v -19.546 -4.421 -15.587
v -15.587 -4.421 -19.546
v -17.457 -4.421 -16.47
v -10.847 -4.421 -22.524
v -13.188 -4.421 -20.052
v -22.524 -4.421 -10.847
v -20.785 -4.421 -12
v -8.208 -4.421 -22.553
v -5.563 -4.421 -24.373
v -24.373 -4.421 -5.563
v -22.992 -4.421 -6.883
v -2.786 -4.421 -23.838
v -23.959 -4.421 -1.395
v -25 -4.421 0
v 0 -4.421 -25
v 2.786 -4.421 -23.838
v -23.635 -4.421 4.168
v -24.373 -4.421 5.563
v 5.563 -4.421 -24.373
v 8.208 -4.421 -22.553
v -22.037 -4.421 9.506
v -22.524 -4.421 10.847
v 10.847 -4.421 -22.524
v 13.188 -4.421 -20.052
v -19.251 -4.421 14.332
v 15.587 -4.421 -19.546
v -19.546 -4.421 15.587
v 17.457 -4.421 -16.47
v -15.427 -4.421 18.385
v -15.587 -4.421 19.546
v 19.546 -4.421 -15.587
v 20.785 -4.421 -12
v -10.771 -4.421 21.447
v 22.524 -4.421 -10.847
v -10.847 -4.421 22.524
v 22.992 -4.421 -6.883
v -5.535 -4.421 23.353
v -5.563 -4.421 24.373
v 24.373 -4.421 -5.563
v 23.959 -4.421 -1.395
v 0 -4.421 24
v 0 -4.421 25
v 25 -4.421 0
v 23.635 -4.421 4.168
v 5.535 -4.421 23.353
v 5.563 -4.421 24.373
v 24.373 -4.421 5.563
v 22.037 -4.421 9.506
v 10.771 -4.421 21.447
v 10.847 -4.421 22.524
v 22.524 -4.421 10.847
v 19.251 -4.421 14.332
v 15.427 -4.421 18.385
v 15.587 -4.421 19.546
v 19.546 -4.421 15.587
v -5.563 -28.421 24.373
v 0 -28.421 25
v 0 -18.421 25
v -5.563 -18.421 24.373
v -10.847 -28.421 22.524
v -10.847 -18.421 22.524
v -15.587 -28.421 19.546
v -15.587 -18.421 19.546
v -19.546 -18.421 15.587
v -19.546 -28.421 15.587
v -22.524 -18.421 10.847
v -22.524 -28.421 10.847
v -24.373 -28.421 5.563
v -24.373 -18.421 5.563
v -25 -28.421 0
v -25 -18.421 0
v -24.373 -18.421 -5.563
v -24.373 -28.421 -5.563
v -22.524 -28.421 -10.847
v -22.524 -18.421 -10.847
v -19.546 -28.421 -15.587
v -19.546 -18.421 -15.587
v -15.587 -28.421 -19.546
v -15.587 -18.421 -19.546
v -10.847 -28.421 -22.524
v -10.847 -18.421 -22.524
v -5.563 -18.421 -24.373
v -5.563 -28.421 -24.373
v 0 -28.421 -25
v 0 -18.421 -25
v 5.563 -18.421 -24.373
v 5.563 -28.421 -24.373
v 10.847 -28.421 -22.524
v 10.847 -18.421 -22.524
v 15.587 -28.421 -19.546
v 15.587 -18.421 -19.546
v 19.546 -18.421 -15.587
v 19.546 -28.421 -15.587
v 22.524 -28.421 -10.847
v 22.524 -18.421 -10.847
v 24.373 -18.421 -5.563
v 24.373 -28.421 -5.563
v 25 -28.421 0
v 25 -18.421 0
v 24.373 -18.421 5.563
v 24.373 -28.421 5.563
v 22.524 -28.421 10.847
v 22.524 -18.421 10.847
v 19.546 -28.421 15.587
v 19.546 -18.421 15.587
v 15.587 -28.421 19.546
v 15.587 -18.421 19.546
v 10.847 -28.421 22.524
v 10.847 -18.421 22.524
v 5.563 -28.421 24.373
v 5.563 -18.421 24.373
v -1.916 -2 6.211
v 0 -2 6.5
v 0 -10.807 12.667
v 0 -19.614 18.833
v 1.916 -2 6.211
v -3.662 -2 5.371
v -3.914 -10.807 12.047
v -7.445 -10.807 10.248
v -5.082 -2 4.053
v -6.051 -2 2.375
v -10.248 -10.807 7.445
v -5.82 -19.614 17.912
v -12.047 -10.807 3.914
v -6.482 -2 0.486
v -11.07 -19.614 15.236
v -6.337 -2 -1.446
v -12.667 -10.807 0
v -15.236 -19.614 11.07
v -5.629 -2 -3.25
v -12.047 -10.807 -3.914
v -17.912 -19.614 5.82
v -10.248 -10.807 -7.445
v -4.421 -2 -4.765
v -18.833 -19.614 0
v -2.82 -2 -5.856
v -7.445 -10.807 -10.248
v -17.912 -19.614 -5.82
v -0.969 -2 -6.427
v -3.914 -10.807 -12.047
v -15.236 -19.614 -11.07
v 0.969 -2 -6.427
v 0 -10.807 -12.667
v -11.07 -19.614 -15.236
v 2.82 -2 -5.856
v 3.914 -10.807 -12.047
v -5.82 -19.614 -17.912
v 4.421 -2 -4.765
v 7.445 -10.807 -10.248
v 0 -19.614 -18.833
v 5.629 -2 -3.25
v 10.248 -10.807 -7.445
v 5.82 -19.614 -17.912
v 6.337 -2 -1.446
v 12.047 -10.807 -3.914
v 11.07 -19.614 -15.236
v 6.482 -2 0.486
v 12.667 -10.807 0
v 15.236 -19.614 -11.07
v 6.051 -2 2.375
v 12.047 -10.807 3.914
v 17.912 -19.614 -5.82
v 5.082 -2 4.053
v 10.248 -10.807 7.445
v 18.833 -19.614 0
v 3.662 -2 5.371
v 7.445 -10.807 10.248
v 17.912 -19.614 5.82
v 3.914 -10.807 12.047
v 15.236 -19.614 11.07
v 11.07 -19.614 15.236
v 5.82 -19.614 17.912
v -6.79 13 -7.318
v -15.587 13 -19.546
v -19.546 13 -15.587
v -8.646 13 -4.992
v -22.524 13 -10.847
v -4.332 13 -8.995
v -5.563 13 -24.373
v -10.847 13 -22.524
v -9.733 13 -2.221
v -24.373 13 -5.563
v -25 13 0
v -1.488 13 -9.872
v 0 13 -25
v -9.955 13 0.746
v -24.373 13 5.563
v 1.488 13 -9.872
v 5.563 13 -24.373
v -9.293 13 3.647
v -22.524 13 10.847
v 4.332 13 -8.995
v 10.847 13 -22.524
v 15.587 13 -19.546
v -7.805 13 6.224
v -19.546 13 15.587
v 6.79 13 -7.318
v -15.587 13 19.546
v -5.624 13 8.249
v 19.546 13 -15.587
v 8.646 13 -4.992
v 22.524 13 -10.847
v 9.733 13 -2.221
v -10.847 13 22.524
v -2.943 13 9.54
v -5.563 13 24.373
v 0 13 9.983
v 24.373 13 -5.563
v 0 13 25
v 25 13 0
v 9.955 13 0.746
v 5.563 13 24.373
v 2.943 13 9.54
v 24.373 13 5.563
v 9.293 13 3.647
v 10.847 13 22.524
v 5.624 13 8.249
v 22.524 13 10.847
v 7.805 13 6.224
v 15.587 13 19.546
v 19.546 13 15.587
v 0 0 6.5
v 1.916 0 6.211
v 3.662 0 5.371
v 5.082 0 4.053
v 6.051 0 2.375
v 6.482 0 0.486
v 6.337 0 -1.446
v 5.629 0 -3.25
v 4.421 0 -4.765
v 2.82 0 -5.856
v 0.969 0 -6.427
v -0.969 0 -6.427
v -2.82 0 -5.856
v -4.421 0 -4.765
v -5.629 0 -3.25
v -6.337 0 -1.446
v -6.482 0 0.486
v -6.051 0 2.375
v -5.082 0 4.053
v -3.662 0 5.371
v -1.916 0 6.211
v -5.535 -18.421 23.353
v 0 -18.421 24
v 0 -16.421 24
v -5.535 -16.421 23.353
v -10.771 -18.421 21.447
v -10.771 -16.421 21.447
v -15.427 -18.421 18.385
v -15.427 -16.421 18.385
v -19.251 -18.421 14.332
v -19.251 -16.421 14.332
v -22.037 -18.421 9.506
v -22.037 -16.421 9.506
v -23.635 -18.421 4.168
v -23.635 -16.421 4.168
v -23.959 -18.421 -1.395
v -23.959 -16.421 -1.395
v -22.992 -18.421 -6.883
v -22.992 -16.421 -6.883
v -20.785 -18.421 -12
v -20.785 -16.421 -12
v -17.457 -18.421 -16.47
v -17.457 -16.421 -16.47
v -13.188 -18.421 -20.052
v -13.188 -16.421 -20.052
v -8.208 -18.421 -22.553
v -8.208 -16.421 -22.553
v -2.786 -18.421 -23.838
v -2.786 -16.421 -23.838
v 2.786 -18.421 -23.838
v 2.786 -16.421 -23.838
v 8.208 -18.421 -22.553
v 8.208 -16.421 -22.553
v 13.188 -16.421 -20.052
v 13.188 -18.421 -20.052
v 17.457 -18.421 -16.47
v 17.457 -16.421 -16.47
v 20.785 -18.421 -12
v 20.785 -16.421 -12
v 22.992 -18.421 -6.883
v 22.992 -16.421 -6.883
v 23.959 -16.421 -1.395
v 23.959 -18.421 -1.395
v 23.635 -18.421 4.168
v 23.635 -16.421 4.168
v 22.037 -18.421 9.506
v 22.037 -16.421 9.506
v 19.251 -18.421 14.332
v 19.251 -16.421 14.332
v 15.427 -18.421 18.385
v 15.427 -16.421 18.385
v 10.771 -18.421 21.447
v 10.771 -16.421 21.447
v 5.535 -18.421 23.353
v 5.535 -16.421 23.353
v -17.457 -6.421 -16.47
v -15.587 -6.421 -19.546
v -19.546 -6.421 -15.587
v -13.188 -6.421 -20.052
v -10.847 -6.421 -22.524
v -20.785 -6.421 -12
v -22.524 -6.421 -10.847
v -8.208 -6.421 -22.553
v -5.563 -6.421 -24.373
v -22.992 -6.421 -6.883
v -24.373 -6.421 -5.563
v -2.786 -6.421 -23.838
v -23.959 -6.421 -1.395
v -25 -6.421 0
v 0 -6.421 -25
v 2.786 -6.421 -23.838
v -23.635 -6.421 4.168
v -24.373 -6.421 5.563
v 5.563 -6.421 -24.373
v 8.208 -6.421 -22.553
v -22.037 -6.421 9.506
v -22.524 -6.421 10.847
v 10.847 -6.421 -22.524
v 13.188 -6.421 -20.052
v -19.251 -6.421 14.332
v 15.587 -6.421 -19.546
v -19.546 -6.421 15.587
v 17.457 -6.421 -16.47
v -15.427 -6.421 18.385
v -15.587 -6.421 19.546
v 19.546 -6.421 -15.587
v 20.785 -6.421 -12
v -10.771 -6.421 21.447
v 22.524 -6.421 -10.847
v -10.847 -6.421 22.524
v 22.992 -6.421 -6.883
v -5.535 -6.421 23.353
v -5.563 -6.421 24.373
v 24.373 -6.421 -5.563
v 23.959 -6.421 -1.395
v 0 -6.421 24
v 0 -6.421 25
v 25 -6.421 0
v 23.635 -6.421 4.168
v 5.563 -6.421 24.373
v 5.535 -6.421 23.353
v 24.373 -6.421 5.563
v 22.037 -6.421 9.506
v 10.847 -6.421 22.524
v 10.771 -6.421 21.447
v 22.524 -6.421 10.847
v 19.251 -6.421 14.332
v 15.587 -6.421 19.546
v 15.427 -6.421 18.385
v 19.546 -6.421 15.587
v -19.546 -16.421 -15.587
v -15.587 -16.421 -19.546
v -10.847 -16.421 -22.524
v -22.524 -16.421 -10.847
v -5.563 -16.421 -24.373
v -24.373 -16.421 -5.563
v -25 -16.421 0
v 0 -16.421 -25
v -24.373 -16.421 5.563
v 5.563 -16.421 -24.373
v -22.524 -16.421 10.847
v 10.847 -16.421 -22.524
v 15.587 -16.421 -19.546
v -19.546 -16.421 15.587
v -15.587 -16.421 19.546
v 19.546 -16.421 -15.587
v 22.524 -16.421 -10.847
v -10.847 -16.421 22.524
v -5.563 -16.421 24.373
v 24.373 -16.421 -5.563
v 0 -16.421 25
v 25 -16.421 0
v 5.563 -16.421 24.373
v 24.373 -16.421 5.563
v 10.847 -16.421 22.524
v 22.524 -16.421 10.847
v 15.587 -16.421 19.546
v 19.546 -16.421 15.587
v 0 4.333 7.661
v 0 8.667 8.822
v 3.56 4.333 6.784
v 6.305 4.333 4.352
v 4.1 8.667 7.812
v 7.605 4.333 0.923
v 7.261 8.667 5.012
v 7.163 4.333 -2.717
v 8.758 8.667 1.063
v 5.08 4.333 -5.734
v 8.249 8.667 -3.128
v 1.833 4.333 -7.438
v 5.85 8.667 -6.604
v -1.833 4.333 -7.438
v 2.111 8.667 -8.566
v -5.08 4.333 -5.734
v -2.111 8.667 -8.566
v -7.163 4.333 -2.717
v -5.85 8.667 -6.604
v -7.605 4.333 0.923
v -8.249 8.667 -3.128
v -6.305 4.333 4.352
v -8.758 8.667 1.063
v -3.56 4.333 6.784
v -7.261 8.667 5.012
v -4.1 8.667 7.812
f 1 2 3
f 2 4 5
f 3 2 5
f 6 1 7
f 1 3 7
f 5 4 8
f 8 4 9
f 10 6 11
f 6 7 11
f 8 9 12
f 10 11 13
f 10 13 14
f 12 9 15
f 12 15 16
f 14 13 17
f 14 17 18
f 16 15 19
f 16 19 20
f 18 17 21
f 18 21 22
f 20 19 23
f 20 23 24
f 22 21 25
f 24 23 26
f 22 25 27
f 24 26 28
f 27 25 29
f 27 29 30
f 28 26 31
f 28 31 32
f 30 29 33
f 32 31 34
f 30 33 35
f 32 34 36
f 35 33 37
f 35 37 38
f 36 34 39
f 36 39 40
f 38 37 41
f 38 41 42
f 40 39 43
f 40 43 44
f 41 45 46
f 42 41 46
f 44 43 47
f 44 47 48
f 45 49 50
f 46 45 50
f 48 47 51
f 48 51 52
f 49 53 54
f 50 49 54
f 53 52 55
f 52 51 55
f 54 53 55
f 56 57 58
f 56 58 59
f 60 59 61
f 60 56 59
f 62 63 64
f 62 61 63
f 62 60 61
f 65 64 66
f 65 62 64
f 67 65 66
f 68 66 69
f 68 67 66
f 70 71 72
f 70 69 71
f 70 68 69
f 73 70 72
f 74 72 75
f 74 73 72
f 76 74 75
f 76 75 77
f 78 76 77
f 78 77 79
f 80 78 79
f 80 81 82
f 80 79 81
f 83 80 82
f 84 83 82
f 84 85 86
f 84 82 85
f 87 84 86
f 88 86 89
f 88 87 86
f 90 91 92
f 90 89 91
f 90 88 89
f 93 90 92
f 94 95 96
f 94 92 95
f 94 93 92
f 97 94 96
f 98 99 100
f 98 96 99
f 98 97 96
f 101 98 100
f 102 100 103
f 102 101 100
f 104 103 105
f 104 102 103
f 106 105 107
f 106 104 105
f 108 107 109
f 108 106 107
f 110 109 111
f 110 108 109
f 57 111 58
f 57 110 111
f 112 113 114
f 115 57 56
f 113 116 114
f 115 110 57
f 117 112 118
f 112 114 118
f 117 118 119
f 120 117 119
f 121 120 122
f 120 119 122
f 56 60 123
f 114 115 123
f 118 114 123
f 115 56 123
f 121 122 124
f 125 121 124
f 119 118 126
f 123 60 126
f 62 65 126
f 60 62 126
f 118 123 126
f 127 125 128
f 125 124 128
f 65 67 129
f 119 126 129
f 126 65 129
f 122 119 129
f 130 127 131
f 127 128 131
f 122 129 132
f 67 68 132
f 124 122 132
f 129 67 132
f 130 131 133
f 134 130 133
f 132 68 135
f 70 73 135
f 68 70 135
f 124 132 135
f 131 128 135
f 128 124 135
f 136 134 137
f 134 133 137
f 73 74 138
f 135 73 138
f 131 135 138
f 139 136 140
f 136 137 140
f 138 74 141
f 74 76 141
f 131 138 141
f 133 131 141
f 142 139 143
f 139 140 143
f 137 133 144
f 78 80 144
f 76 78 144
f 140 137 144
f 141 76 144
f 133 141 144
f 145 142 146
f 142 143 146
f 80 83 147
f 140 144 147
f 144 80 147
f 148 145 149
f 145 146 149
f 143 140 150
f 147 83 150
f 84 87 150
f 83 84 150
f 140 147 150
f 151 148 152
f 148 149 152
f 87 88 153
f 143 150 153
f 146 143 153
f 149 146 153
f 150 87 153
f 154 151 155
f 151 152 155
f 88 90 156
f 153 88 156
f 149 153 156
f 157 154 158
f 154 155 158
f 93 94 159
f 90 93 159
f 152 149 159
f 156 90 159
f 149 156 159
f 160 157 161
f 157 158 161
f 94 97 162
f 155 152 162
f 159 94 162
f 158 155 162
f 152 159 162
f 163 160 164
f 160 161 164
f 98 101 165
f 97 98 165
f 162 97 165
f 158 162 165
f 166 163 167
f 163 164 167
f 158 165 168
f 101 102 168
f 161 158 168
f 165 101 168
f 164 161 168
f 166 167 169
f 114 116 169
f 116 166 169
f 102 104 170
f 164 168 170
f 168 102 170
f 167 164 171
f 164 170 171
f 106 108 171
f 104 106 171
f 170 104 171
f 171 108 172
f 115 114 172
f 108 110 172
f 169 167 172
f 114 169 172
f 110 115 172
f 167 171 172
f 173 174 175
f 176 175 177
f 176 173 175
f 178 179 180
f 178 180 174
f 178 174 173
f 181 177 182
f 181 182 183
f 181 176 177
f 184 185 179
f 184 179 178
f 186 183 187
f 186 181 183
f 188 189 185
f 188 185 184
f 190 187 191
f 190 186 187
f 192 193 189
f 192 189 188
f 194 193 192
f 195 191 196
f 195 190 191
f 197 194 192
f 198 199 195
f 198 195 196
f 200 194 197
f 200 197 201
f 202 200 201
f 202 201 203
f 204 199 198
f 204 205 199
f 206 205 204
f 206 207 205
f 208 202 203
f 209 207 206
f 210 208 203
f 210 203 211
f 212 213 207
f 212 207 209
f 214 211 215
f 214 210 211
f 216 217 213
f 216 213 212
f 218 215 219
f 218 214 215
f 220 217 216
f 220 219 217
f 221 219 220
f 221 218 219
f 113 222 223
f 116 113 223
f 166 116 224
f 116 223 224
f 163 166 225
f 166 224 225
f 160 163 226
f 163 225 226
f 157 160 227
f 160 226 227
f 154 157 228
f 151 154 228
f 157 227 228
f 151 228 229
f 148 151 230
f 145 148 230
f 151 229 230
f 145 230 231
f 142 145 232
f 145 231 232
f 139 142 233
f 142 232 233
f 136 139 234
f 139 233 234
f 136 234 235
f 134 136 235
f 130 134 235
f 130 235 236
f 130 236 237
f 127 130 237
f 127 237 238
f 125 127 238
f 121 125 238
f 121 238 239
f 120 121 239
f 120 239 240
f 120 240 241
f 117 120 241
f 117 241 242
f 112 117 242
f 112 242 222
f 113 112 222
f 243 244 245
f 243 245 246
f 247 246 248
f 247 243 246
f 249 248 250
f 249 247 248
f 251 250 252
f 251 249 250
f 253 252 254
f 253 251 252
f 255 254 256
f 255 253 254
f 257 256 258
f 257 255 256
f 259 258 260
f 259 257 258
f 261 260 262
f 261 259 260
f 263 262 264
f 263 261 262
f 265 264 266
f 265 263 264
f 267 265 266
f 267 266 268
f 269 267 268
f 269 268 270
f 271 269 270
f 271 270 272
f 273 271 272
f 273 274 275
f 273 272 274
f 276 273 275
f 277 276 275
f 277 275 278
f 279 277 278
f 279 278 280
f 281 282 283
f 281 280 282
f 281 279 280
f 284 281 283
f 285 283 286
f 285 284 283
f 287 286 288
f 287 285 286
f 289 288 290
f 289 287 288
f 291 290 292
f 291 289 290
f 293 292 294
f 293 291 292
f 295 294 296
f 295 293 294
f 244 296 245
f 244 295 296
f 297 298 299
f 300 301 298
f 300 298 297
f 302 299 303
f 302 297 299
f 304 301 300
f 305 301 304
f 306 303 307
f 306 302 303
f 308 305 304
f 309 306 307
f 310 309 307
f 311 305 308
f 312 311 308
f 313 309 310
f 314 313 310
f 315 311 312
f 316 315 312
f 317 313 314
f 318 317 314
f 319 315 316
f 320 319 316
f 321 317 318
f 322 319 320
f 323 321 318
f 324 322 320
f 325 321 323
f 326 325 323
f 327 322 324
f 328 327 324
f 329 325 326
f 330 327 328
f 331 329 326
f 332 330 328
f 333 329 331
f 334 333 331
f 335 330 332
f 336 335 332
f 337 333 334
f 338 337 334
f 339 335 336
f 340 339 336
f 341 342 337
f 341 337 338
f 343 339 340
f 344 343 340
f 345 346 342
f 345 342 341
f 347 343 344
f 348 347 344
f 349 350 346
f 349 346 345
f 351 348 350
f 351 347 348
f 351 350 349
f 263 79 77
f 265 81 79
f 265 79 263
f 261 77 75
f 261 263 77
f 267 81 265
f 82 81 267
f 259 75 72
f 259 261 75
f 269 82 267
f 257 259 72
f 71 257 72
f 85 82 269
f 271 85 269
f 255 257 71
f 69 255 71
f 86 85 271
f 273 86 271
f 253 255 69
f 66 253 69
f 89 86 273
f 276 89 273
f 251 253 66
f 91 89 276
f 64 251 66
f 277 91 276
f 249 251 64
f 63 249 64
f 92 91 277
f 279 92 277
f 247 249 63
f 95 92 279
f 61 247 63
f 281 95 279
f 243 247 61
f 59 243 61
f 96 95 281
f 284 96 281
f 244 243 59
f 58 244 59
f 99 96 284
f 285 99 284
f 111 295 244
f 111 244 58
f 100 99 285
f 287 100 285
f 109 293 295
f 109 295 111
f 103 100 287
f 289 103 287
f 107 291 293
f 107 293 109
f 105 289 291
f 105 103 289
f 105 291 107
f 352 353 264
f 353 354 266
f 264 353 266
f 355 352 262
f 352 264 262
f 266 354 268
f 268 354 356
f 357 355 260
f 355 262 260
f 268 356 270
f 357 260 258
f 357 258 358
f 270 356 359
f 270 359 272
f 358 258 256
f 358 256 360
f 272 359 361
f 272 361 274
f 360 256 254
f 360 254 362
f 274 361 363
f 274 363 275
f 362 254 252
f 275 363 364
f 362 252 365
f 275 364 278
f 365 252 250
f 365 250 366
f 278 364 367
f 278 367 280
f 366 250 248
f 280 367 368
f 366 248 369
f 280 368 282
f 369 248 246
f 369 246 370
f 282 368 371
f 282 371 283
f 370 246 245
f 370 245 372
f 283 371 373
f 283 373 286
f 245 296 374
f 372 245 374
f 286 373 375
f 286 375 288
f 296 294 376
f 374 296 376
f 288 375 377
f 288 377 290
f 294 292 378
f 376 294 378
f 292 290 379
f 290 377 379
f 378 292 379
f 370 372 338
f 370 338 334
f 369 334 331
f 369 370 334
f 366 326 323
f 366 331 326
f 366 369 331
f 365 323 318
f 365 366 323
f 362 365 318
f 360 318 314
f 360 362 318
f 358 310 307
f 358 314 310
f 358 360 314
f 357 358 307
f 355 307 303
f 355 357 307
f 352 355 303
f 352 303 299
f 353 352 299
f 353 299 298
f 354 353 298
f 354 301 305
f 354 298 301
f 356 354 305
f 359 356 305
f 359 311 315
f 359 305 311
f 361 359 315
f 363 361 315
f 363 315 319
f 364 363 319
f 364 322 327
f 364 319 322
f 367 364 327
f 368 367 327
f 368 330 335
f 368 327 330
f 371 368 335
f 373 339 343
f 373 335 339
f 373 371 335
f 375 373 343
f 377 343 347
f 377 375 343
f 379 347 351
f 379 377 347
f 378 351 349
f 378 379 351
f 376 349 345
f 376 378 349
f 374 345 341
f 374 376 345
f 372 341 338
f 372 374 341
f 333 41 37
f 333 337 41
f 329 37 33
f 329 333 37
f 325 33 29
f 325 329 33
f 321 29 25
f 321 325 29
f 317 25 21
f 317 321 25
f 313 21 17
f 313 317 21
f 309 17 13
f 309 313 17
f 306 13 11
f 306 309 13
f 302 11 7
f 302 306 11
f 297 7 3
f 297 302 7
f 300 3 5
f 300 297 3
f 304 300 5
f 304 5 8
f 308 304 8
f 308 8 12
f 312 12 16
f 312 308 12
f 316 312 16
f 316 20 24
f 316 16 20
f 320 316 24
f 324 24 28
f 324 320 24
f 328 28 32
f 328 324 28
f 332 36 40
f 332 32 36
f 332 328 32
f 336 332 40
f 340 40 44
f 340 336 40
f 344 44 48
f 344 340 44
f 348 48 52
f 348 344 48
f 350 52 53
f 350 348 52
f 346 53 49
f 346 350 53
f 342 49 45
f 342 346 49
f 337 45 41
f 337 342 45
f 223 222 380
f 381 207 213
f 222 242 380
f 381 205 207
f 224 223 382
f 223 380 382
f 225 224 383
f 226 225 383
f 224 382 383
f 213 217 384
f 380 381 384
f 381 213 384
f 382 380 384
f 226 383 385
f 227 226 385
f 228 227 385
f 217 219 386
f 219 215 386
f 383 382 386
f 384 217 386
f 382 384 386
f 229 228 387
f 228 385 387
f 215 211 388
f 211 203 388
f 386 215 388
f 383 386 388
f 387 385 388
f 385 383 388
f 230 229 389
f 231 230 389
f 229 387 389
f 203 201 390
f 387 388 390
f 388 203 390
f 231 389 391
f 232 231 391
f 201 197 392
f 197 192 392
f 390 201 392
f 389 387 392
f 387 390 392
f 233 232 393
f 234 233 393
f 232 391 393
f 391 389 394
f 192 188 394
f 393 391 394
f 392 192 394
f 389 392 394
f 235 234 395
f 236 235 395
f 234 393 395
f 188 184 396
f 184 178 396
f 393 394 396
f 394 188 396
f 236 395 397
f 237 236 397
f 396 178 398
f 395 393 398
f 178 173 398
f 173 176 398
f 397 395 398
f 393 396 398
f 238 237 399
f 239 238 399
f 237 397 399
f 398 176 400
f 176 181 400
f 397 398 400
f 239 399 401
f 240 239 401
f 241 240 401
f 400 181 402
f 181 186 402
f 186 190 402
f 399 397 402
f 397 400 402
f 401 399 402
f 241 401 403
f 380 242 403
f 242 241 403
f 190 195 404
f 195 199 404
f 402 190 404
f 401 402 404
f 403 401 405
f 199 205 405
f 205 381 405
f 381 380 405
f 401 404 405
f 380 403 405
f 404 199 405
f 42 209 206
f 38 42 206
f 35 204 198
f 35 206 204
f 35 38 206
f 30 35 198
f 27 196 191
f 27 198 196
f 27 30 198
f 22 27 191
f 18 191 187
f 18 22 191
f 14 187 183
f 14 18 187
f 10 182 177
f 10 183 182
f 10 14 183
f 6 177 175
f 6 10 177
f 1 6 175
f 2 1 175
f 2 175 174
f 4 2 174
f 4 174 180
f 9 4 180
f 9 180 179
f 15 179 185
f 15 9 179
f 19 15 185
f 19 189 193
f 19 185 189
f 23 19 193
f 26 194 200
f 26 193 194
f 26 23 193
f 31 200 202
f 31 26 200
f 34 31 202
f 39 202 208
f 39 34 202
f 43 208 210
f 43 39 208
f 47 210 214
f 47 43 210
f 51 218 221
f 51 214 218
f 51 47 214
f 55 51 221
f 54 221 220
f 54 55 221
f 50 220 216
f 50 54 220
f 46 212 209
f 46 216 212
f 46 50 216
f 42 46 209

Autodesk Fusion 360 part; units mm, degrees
sketch "Sketch1" plane through (0, 0, 0) normal (1, 0, 0) x (0, 1, 0)
  line L0 (0, 0) -> (0, 6.5)
  line L1 (0, 6.5) -> (13, 9.9833)
  line L2 (0, 6.5) -> (200, 6.5) construction
  line L3 (0, 0) -> (0, 6.5)
  line L4 (0, 10) -> (13, 10)
  line L5 (13, 10) -> (13, 6.5)
  line L6 (-2, 6.5) -> (0, 6.5)
  line L7 (-2, 0) -> (0, 0)
  line L8 (-2, 6.5) -> (-28.4207, 25)
  line L9 (-2, 6.5) -> (198, 6.5) construction
  line L10 (0, 25) -> (-28.4207, 25)
  line L11 (0, 0) -> (0, 6.5)
  line L12 (0, 10) -> (0, 25)
  line L13 (13, 9.9833) -> (13, 25)
  line L14 (13, 25) -> (0, 25)
  line L15 (-28.4207, 25) -> (-18.4207, 25)
  line L16 (-18.4207, 25) -> (-16.4207, 25)
  line L17 (-16.4207, 25) -> (-16.4207, 24)
  line L18 (-16.4207, 24) -> (-18.4207, 24)
  line L19 (-18.4207, 24) -> (-18.4207, 25)
  line L20 (-16.4207, 25) -> (-6.4207, 25)
  line L21 (-6.4207, 25) -> (-4.4207, 25)
  line L22 (-4.4207, 25) -> (-4.4207, 24)
  line L23 (-4.4207, 24) -> (-6.4207, 24)
  line L24 (-6.4207, 24) -> (-6.4207, 25)
  dimension "d7" = 6.5
  dimension "d8" = 15
  dimension "d10" = 10
  dimension "d11" = 6.5
  dimension "d12" = 145
  dimension "d14" = 25
  dimension "d15" = 10
  dimension "d16" = 2
  dimension "d17" = 1
  dimension "d18" = 10
  dimension "d19" = 2
  dimension "d20" = 1
revolve "Revolve1" add sketch "Sketch1" angle 360 about axis through (0, 1.75, 0) along (0, 1, 0) contours L1 L4 L5 L6 L8 L10 L12 L13 L15 L17 L18 L19 L20 L22 L23 L24 | L4 L12 L13 L14
